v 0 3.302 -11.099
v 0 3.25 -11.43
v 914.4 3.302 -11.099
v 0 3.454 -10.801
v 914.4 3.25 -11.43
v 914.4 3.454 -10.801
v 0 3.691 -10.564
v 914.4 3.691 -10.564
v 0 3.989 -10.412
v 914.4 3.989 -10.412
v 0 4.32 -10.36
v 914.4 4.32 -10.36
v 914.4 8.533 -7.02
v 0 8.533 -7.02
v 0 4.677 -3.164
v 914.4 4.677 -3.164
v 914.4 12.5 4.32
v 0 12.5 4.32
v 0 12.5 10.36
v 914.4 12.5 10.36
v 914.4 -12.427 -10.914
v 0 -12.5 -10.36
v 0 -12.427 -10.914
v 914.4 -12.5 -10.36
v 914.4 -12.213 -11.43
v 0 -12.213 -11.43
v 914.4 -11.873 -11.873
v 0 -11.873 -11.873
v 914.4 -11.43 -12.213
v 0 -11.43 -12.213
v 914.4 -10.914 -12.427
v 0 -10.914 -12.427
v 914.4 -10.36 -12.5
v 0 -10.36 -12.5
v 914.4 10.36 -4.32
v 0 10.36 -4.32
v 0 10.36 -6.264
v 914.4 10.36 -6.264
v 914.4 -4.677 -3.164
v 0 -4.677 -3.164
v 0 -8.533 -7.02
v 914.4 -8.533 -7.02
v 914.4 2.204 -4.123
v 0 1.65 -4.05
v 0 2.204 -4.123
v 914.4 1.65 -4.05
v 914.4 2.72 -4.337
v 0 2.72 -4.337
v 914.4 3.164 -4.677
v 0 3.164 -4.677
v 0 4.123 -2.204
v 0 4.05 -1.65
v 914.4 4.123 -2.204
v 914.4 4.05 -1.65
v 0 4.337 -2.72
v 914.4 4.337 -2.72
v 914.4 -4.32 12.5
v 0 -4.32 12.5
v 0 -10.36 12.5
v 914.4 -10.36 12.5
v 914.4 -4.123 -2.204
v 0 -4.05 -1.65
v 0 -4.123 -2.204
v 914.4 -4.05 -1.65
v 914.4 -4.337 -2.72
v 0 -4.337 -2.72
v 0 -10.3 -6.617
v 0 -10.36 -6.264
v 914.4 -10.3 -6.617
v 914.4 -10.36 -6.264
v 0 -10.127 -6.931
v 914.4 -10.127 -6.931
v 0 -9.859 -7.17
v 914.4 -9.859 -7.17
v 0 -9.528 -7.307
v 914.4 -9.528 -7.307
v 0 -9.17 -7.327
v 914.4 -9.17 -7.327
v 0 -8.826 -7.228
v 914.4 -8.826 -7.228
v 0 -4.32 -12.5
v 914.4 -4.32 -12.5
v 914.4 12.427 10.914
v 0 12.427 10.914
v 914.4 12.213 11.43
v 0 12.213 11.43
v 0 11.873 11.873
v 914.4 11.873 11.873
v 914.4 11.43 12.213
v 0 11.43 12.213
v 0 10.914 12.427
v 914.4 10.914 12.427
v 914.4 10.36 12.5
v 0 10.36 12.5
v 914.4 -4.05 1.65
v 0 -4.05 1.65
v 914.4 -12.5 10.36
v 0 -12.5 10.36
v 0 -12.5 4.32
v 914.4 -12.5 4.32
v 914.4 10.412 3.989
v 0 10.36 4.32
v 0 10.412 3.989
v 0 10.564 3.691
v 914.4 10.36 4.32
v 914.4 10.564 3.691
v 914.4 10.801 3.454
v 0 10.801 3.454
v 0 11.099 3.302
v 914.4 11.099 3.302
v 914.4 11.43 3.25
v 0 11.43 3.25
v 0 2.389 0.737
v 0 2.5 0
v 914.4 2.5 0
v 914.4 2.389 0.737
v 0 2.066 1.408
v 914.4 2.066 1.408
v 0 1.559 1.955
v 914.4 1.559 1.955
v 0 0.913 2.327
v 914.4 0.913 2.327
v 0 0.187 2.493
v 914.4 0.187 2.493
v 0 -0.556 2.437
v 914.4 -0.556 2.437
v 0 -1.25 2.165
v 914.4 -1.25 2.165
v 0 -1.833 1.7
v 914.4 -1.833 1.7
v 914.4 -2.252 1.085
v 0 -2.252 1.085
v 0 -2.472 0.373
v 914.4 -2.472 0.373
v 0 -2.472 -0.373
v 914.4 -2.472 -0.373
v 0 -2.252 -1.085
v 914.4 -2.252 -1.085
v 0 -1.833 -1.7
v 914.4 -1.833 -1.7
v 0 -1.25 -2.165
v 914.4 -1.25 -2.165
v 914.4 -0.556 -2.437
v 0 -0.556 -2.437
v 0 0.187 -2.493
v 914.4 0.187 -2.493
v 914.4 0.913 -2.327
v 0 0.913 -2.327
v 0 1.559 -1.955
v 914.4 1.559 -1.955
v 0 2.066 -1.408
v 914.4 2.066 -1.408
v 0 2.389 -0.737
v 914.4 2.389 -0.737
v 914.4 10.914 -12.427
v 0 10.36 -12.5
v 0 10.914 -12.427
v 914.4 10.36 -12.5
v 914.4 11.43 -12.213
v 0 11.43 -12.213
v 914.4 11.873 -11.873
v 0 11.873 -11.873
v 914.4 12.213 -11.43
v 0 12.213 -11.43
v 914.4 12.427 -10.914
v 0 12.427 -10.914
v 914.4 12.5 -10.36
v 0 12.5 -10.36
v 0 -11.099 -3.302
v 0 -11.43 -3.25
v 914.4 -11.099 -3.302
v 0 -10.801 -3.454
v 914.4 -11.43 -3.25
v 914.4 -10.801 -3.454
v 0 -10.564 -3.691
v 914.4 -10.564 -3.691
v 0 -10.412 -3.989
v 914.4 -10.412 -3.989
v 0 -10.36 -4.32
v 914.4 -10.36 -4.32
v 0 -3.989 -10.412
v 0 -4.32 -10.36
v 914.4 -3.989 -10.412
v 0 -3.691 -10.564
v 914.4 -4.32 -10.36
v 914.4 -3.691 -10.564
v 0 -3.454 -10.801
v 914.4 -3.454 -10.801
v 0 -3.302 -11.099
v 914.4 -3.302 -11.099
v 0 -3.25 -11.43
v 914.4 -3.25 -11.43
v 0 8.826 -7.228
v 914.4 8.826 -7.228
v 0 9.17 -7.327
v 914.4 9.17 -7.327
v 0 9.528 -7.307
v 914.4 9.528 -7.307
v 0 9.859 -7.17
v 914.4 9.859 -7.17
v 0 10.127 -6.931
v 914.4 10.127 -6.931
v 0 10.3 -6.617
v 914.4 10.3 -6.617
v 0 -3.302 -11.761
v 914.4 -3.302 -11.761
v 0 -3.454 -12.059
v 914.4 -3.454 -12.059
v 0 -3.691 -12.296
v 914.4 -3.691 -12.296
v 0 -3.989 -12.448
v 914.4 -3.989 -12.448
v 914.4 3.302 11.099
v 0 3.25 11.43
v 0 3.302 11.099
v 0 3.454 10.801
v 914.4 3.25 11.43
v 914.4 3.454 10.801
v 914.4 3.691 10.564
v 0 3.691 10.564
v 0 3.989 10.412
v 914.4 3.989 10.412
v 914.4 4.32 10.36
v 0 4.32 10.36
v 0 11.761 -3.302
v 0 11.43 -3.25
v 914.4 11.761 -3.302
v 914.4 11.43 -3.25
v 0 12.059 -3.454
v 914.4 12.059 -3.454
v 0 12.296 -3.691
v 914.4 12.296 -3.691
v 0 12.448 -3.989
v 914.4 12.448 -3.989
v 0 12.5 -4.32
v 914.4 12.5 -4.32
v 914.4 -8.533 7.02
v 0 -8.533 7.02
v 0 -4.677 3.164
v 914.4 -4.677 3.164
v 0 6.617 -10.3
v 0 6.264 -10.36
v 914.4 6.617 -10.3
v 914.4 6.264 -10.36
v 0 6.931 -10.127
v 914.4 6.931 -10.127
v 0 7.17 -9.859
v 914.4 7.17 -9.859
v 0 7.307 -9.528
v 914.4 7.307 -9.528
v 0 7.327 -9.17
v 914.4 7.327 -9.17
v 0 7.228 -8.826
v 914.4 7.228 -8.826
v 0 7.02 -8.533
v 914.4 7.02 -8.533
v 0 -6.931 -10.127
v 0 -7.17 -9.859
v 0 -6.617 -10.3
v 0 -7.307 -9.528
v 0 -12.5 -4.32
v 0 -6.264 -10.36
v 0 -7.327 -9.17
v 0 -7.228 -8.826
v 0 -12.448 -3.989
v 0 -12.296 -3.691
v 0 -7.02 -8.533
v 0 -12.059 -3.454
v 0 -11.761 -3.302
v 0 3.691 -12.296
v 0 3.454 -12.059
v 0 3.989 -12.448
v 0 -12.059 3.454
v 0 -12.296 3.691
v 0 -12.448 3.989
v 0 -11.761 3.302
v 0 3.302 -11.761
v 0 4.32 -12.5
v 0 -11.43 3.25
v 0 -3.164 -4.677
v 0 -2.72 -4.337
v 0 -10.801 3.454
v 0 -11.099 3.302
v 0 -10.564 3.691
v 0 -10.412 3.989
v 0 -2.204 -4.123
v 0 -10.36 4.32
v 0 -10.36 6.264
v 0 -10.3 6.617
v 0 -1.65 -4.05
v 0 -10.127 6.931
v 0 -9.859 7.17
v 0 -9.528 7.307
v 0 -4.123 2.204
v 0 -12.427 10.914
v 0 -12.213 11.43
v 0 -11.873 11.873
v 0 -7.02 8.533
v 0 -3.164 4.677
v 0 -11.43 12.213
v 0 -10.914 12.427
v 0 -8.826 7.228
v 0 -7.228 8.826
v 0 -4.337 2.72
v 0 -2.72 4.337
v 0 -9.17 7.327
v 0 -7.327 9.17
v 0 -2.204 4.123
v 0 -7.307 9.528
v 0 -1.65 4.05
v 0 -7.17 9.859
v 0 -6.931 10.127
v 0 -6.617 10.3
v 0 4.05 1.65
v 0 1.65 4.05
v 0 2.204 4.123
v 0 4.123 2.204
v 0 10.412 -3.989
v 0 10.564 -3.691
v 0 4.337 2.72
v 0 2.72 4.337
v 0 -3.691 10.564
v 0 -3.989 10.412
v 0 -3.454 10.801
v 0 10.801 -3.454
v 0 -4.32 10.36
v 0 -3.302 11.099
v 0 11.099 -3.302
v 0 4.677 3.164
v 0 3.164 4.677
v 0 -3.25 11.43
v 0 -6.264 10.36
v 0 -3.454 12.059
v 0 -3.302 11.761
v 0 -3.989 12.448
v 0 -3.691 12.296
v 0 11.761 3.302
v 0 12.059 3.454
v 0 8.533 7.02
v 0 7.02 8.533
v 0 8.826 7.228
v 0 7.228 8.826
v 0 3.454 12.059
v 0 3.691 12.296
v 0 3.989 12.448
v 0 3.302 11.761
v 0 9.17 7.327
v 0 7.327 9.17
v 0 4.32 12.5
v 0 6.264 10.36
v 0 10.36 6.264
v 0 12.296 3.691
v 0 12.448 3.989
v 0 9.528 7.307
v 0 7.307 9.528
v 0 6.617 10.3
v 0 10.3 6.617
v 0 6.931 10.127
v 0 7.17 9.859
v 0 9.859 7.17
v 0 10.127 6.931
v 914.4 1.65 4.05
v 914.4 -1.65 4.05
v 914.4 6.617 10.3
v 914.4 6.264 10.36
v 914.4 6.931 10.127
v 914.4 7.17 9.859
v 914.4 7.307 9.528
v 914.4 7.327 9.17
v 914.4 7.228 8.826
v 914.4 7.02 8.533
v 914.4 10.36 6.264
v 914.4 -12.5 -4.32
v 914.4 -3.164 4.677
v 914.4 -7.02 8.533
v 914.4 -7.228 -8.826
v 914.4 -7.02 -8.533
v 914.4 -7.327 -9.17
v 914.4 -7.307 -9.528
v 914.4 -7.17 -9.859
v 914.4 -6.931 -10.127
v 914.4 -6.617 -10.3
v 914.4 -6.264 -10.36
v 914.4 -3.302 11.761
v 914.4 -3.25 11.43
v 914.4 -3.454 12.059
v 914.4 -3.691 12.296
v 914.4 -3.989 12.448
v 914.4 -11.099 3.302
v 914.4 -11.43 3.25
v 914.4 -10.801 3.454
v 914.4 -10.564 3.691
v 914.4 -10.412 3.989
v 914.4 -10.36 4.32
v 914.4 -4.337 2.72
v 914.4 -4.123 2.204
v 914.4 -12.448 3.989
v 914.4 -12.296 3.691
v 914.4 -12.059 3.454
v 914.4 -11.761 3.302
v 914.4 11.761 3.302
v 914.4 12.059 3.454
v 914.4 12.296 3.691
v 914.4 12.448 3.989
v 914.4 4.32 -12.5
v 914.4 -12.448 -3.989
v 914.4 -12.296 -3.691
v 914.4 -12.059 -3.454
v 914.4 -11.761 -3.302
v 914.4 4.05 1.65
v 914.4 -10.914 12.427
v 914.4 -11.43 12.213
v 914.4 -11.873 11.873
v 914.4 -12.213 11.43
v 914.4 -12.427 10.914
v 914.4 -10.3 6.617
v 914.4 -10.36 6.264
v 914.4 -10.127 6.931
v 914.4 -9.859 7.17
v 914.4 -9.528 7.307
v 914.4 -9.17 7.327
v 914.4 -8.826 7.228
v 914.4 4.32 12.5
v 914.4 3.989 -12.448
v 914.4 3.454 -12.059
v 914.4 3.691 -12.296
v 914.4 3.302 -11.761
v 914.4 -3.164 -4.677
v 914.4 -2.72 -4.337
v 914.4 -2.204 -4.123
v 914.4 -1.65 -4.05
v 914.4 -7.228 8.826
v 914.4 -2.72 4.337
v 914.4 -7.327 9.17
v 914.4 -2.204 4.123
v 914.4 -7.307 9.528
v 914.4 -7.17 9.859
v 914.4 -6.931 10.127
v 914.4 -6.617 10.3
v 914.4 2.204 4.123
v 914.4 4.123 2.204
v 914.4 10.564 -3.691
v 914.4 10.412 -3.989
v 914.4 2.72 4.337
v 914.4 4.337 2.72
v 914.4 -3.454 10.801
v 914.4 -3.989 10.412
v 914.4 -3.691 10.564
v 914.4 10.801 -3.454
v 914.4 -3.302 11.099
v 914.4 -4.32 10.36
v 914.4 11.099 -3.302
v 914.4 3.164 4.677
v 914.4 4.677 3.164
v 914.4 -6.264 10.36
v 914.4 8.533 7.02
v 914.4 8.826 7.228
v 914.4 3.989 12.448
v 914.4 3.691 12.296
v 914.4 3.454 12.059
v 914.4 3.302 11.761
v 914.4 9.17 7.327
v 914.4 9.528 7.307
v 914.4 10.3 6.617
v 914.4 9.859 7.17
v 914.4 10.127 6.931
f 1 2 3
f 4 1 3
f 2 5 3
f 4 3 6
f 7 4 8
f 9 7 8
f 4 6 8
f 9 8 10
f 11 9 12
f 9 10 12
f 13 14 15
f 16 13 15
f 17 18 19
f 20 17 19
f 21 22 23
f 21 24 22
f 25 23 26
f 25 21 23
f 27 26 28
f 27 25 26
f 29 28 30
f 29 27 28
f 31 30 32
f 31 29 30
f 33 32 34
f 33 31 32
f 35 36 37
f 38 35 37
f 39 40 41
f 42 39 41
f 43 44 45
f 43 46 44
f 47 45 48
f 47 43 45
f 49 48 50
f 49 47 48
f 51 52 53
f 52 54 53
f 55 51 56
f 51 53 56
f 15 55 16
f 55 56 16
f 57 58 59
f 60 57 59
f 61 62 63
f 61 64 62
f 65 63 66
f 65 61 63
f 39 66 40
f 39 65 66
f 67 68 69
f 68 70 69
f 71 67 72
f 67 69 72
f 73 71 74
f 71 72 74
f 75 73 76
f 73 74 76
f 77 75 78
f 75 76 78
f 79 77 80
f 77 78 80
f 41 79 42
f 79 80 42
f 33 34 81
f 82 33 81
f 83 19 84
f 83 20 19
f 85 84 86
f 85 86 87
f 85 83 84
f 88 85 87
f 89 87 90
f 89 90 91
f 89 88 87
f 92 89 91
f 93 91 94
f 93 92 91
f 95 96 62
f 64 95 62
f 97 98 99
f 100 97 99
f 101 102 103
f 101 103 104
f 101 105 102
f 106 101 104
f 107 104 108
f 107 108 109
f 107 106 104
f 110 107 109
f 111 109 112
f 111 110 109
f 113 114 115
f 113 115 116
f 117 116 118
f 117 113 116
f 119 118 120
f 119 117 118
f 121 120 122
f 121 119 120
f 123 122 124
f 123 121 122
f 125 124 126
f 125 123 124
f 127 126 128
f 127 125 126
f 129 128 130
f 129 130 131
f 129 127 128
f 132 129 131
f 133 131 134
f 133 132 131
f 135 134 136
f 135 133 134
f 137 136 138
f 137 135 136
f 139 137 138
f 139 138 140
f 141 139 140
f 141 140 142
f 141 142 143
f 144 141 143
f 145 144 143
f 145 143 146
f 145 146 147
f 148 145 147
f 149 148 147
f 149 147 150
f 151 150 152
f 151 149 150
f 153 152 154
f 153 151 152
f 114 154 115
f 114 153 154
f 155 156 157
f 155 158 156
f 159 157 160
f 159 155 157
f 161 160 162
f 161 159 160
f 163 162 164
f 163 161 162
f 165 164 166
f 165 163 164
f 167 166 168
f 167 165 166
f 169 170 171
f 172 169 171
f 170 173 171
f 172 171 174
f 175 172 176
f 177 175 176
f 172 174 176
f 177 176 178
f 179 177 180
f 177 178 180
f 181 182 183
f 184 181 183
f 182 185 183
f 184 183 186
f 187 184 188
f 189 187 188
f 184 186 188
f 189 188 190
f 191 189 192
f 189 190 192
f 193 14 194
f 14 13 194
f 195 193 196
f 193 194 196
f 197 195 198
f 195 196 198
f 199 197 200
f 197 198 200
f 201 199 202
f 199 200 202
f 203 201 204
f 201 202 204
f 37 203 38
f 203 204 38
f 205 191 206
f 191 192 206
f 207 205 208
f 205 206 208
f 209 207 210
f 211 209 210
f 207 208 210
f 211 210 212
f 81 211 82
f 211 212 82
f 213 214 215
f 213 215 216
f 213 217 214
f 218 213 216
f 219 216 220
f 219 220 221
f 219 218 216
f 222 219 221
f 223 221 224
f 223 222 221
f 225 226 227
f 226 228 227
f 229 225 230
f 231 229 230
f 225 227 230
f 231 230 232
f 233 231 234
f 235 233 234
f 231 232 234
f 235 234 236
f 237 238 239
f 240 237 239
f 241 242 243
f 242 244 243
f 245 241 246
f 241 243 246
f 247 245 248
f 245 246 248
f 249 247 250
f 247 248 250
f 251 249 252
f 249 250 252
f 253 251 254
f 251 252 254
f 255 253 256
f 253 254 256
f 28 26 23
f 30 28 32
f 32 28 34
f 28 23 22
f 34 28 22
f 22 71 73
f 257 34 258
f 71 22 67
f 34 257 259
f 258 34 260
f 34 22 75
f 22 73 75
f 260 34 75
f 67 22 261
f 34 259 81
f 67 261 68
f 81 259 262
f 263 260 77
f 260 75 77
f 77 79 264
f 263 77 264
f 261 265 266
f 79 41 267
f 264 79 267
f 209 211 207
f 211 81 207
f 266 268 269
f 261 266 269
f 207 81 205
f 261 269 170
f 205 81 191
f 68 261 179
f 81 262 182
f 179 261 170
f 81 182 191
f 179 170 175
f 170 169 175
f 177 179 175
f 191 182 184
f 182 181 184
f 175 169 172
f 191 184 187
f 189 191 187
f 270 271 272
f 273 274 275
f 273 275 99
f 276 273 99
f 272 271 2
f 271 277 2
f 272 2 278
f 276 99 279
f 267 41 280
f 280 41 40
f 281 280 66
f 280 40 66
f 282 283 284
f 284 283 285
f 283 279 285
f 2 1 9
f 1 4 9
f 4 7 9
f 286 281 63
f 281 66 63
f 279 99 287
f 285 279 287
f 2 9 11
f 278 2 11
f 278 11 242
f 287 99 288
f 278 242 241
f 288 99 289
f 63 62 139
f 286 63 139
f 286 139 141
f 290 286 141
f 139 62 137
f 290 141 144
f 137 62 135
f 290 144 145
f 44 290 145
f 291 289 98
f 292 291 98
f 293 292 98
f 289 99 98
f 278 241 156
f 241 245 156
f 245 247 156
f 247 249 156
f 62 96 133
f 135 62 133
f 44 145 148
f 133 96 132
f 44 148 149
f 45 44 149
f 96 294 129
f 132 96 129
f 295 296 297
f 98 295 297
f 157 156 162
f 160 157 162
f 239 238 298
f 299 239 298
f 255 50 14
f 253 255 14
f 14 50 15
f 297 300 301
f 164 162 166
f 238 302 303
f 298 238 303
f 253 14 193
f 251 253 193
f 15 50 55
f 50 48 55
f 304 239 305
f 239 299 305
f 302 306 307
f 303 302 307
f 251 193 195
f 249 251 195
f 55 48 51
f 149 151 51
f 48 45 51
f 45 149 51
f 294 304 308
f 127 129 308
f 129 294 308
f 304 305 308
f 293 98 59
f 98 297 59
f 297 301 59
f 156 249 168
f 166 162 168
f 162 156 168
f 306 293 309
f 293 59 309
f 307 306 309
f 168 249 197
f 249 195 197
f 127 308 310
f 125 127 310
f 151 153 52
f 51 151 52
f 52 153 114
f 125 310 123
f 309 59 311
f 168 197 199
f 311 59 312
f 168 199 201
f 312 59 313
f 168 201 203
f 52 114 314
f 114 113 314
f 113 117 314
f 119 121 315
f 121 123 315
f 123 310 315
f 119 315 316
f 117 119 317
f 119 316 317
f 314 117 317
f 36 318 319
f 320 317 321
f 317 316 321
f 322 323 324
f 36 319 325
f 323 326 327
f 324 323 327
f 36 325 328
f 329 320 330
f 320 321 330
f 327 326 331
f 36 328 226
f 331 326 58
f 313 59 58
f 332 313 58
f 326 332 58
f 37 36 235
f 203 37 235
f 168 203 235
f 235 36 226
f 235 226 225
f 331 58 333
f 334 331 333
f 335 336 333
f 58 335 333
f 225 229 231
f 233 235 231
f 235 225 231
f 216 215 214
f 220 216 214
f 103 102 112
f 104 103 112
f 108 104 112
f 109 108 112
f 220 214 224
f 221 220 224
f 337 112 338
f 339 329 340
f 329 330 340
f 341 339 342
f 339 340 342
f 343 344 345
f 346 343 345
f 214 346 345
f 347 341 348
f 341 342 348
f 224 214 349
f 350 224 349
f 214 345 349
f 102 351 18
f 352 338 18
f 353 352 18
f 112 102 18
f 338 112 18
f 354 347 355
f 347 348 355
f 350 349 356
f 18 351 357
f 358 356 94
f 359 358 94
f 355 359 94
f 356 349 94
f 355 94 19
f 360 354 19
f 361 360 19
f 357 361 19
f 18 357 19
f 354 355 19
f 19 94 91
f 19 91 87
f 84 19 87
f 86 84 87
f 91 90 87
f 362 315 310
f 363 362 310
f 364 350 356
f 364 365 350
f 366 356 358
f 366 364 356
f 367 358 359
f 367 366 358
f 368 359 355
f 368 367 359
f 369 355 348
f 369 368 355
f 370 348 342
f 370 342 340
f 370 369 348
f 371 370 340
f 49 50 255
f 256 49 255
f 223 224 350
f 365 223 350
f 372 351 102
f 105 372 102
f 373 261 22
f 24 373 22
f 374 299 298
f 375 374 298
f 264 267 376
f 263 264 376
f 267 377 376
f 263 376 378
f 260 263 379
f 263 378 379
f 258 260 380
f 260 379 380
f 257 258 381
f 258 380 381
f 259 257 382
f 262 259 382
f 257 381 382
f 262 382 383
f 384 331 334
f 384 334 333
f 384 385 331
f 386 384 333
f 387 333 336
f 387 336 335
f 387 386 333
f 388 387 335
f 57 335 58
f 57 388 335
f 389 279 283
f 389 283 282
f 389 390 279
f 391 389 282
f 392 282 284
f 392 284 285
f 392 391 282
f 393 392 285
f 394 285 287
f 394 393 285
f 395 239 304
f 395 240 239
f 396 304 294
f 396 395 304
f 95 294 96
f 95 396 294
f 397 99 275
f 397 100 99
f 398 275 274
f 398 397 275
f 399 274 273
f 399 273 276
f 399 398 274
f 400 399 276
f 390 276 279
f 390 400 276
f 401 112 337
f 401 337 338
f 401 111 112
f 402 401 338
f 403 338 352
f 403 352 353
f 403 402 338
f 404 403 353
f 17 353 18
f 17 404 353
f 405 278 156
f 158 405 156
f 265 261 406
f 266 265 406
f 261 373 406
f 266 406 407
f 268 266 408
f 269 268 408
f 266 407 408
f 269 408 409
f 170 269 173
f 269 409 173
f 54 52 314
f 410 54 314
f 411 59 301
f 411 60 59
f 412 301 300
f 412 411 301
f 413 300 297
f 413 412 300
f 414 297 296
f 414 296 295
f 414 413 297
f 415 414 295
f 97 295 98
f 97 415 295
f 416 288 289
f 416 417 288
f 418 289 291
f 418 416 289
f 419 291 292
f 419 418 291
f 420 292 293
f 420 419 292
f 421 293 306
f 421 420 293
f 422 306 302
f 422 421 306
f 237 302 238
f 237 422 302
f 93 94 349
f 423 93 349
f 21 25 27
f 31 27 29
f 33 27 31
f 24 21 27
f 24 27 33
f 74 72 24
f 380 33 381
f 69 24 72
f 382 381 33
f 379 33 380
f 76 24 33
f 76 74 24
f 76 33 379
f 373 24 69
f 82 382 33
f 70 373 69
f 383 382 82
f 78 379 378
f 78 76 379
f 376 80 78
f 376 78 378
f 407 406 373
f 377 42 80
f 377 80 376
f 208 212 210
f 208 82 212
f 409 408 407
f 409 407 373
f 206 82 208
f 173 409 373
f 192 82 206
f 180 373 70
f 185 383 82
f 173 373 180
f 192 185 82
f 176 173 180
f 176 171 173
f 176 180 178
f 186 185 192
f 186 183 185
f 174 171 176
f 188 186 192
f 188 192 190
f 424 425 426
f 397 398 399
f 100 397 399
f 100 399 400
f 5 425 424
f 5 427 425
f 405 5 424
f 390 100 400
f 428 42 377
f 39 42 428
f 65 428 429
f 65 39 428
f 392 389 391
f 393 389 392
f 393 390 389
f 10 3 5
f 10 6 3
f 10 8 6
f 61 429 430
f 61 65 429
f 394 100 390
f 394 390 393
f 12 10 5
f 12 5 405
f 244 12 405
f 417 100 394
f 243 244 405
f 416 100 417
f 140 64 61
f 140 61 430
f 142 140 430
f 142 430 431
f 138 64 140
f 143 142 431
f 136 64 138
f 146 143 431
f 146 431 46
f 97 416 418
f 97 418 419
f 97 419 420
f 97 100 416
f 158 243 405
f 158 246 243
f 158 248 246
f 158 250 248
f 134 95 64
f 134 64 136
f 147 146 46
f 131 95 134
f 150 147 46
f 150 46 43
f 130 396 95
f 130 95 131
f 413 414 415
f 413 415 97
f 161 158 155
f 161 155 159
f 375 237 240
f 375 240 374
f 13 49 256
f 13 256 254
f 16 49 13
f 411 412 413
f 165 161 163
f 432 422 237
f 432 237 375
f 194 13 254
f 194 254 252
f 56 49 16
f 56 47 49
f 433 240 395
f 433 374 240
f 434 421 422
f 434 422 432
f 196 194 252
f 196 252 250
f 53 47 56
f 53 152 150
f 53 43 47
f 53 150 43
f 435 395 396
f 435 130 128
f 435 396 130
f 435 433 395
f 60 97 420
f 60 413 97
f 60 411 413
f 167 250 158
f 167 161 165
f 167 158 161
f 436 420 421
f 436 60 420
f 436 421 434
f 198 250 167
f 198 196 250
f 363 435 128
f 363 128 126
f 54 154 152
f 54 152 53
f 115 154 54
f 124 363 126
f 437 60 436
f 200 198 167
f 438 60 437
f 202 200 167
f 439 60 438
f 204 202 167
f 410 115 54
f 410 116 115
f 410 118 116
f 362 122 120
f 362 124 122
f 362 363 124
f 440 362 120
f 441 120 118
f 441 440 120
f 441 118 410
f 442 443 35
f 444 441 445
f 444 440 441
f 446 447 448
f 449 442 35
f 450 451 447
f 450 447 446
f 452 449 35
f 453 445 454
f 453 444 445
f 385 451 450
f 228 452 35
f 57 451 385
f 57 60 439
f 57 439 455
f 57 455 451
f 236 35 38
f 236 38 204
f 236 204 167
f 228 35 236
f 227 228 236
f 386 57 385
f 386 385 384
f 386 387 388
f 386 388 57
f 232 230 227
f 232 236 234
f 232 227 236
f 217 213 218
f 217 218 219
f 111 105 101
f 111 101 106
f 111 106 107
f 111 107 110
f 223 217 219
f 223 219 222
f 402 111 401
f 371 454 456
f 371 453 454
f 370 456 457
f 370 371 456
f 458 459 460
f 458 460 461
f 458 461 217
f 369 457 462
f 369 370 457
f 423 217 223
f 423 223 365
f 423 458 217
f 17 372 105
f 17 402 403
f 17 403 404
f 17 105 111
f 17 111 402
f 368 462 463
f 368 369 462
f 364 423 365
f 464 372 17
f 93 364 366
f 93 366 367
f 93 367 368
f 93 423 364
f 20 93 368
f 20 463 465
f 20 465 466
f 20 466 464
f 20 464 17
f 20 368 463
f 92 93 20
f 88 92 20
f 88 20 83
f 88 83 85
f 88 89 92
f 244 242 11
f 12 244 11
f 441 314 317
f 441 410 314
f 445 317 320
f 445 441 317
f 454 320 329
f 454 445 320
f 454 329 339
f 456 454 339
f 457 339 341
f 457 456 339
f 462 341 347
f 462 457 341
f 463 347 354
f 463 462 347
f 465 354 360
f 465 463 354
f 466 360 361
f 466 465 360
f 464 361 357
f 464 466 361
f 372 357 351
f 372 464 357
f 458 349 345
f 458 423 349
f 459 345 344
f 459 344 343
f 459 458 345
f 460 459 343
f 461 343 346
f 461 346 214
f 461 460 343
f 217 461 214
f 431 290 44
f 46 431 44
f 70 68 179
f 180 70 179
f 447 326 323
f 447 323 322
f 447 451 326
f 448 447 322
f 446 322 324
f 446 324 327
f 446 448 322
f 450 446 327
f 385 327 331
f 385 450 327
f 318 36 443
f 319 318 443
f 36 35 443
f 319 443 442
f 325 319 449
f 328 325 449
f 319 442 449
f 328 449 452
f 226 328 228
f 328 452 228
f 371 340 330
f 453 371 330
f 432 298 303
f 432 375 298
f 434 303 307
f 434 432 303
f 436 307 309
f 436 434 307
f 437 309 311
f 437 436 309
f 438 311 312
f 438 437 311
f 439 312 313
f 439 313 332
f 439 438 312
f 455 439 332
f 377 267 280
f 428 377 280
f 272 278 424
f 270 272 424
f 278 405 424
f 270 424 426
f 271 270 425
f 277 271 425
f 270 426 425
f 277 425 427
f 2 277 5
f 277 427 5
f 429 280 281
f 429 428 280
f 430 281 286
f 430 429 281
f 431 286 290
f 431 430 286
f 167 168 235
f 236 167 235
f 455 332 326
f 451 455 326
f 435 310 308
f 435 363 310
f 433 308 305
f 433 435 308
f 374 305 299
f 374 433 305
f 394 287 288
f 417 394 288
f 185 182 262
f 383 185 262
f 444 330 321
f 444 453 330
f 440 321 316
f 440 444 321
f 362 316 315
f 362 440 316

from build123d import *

# Parameters (mm, degrees)
F0_R     = 2.5
F2_DEPTH = 914.4
F3_R     = 2.14
F4_R     = 1.06999


# Not quite as in the source:
# - a fillet or chamfer is up to 0.001 mm smaller than in the source, because OpenCascade refuses the exact size


with BuildPart() as f2:
    # F0 (on Right) → F2 (new body)
    with BuildSketch(Plane.YZ):
        Polygon((2.5367914883, -4.05), (4.05, -4.05), (4.05, -2.5367914883), (4.05, 2.5367914883), (4.05, 4.05), (2.5367914883, 4.05), (-2.5367914883, 4.05), (-4.05, 4.05), (-4.05, 2.5367914883), (-4.05, -2.5367914883), (-4.05, -4.05), (-2.5367914883, -4.05), align=None)
        Circle(F0_R, mode=Mode.SUBTRACT)
        Polygon((-10.36, 8.8467914883), (-4.05, 2.5367914883), (-4.05, 4.05), (-2.5367914883, 4.05), (-8.8467914883, 10.36), (-3.25, 10.36), (-3.25, 12.5), (-12.5, 12.5), (-12.5, 3.25), (-10.36, 3.25), align=None)
        Polygon((4.05, 4.05), (4.05, 2.5367914883), (10.36, 8.8467914883), (10.36, 3.25), (12.5, 3.25), (12.5, 12.5), (3.25, 12.5), (3.25, 10.36), (8.8467914883, 10.36), (2.5367914883, 4.05), align=None)
        Polygon((-8.8467914883, -10.36), (-2.5367914883, -4.05), (-4.05, -4.05), (-4.05, -2.5367914883), (-10.36, -8.8467914883), (-10.36, -3.25), (-12.5, -3.25), (-12.5, -12.5), (-3.25, -12.5), (-3.25, -10.36), align=None)
        Polygon((4.05, -2.5367914883), (4.05, -4.05), (2.5367914883, -4.05), (8.8467914883, -10.36), (3.25, -10.36), (3.25, -12.5), (12.5, -12.5), (12.5, -3.25), (10.36, -3.25), (10.36, -8.8467914883), align=None)
    extrude(amount=F2_DEPTH)

    # F3
    f3_edges = [f2.edges().sort_by_distance(p)[0] for p in [
        (457.2, -12.5, 12.5),
        (457.2, 12.5, 12.5),
        (457.2, 12.5, -12.5),
        (457.2, -12.5, -12.5),
        (457.2, -4.05, 2.536791),
        (457.2, -4.05, -2.536791),
        (457.2, -2.536791, 4.05),
        (457.2, 2.536791, 4.05),
        (457.2, 4.05, 2.536791),
        (457.2, 4.05, -2.536791),
        (457.2, -2.536791, -4.05),
        (457.2, 2.536791, -4.05),
    ]]
    fillet(f3_edges, radius=F3_R)

    # F4 (radius 1.07 in the source; OpenCascade refuses exactly that, so slightly less here)
    f4_edges = [f2.edges().sort_by_distance(p)[0] for p in [
        (457.2, -12.5, 3.25),
        (457.2, -10.36, 3.25),
        (457.2, -3.25, 12.5),
        (457.2, -3.25, 10.36),
        (457.2, 3.25, 12.5),
        (457.2, 3.25, 10.36),
        (457.2, 10.36, 3.25),
        (457.2, 12.5, 3.25),
        (457.2, 10.36, -3.25),
        (457.2, 12.5, -3.25),
        (457.2, 3.25, -10.36),
        (457.2, 3.25, -12.5),
        (457.2, -3.25, -10.36),
        (457.2, -3.25, -12.5),
        (457.2, -10.36, 8.846791),
        (457.2, -8.846791, 10.36),
        (457.2, 8.846791, 10.36),
        (457.2, 10.36, 8.846791),
        (457.2, 8.846791, -10.36),
        (457.2, 10.36, -8.846791),
        (457.2, -8.846791, -10.36),
        (457.2, -10.36, -8.846791),
        (457.2, -10.36, -3.25),
        (457.2, -12.5, -3.25),
    ]]
    fillet(f4_edges, radius=F4_R)


solid = f2.part
